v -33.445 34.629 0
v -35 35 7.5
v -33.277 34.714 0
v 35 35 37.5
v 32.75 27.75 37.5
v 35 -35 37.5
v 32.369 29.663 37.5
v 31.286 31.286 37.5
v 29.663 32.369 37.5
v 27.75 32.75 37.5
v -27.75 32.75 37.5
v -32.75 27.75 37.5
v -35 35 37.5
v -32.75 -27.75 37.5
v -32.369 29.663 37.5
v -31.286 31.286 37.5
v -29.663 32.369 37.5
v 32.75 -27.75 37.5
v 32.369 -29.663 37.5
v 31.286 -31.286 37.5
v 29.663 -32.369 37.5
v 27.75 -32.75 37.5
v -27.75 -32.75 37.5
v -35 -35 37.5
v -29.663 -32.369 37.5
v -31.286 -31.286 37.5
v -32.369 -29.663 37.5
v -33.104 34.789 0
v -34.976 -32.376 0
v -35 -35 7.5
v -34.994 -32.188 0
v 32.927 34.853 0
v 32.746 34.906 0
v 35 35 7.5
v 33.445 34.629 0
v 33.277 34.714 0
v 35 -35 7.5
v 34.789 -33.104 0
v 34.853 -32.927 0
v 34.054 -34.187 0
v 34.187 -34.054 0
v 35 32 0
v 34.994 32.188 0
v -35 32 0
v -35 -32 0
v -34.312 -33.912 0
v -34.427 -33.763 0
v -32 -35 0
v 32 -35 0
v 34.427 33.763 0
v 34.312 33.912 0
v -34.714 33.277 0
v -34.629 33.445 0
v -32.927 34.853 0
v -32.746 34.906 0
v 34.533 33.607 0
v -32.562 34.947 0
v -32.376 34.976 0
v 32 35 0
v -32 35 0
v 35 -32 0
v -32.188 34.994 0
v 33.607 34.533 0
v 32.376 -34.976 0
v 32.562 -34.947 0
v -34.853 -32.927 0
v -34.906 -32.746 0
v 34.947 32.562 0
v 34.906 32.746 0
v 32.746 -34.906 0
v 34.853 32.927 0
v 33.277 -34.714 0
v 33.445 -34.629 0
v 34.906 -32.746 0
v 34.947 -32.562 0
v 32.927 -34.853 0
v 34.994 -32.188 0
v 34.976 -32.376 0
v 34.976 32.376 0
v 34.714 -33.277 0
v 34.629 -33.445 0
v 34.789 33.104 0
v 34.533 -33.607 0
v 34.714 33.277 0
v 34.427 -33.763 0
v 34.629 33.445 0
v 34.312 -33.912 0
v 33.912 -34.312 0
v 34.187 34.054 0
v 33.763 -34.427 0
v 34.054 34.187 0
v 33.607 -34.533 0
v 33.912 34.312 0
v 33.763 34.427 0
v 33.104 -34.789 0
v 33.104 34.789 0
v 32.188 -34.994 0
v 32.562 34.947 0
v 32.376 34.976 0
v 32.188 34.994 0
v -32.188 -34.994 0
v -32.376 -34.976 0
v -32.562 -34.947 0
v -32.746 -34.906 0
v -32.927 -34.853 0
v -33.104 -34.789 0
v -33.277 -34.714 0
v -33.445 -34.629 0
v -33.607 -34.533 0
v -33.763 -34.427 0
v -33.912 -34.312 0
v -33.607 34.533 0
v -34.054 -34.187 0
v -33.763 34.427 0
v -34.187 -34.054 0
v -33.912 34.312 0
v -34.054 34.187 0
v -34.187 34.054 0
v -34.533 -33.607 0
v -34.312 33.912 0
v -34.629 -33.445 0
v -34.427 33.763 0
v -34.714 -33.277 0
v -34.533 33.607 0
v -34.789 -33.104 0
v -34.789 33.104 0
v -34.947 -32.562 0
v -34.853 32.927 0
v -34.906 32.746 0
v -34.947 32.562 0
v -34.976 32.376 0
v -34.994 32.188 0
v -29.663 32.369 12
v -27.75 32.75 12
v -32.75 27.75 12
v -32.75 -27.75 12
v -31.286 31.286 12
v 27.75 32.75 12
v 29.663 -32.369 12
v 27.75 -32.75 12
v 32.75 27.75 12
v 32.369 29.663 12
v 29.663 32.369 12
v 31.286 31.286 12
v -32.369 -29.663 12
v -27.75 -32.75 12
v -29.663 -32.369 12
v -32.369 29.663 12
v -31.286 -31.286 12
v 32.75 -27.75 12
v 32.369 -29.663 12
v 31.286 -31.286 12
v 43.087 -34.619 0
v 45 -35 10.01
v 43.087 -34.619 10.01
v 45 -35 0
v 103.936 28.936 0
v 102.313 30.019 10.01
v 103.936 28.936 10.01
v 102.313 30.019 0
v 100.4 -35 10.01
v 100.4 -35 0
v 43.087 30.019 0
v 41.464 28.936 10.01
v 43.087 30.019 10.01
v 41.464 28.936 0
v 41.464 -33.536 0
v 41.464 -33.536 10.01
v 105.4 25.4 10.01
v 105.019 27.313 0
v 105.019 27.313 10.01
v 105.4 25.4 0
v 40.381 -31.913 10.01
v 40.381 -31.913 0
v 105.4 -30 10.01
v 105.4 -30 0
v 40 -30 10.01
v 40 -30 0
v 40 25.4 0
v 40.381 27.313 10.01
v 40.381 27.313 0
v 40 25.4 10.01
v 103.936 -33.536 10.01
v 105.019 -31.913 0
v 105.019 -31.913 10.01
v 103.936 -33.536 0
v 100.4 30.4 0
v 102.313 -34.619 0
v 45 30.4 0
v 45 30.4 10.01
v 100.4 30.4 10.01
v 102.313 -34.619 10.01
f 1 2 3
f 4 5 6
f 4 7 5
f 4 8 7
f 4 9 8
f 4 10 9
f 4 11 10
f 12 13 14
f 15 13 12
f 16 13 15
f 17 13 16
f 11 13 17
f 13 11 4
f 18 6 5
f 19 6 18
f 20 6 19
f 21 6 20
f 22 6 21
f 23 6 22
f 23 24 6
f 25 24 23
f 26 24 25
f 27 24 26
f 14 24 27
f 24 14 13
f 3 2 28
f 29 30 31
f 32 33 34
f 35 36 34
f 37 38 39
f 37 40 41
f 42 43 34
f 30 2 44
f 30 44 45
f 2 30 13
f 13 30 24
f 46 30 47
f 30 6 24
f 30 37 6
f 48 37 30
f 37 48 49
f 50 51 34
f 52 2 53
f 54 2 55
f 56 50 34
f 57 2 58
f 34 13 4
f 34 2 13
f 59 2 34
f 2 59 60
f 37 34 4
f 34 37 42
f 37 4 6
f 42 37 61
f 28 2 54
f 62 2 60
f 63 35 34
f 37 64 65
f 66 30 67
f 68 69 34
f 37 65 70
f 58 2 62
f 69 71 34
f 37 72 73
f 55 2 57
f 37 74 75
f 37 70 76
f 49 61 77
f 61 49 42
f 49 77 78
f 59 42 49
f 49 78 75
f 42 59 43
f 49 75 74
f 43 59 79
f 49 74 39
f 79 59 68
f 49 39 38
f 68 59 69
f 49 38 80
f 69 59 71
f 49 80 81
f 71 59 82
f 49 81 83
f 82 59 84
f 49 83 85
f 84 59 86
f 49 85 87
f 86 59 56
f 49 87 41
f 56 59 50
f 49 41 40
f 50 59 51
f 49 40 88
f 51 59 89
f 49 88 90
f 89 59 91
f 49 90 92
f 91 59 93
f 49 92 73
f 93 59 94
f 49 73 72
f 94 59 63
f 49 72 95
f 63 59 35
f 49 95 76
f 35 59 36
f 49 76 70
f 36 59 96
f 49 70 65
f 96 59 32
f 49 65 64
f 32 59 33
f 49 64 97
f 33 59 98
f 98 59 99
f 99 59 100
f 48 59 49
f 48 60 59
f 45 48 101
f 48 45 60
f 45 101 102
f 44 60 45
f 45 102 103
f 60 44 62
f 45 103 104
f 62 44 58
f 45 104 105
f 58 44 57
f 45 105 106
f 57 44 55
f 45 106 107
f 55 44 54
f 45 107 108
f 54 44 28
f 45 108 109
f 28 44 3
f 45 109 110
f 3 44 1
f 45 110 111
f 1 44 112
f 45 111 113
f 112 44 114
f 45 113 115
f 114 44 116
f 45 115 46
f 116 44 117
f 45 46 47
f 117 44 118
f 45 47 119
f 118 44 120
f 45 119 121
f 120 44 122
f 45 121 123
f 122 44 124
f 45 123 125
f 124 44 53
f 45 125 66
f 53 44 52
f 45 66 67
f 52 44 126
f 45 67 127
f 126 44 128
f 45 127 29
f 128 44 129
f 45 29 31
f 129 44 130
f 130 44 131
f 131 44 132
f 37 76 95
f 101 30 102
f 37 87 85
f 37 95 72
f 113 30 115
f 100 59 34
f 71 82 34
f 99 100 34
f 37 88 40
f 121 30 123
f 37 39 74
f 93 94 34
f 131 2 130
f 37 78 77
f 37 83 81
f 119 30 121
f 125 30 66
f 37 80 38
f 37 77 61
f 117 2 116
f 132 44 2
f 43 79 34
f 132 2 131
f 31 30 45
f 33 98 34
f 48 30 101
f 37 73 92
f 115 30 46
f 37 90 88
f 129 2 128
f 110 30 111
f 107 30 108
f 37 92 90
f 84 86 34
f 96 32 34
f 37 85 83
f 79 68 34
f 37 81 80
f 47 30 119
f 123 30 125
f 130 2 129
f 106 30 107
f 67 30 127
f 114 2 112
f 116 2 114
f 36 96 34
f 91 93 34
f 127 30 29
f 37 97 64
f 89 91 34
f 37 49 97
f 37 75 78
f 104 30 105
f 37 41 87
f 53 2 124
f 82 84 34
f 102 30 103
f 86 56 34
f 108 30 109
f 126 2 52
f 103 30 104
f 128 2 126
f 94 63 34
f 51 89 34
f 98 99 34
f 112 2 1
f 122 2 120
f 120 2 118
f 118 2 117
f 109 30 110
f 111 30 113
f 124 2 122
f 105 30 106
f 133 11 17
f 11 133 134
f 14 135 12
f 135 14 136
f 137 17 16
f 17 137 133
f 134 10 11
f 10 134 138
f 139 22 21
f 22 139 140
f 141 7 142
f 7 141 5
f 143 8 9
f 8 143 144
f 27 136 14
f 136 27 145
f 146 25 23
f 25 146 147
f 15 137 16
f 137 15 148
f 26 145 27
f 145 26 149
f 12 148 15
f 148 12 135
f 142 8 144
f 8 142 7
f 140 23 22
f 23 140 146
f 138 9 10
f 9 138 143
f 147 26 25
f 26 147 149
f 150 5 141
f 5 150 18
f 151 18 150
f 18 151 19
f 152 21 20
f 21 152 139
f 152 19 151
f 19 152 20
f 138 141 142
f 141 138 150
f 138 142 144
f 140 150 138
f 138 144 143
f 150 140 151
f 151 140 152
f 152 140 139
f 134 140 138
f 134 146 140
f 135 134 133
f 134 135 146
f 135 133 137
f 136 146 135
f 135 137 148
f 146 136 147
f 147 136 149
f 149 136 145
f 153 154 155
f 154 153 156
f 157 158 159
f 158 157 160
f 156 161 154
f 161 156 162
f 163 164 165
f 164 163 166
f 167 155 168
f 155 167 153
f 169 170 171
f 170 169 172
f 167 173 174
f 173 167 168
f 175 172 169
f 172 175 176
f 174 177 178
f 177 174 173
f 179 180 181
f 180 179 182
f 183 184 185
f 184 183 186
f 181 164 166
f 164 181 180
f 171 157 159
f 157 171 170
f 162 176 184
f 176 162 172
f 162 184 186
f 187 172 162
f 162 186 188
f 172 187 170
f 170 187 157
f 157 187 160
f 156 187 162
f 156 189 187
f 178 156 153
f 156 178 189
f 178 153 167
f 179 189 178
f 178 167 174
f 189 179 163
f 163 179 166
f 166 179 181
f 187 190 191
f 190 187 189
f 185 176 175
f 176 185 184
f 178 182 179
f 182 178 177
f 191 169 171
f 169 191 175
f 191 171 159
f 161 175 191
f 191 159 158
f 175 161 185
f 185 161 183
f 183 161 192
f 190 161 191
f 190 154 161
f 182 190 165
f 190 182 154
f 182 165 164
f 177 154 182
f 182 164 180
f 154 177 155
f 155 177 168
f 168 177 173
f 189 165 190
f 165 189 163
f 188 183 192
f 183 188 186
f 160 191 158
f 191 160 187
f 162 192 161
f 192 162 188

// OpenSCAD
// parametric box w/lid
// author:  free beachler
// license:  CC 3.0 Share-Alike w/Attribution

base_thickness = 7.5;
wall_thickness = 4.5;
inside_height = 30;	// box height, not including base
width = 70;
leadout = 70;

box_with_inset_lid(base_thickness, wall_thickness, inside_height, width, leadout);

module box_with_inset_lid(bt, wt, h, w, l, hand) {
	box(bt, wt, h, w, l, hand);
	inset_lid(wt, h, w, l);
}

module box(bt, wt, h, w, l) {
	difference() {
		hull() {
		minkowski() {
			translate([-w / 2 + 3, -l / 2 + 3, 0]) cube([w - 3 * 2, l - 3 * 2, bt]);
			cylinder(r = 3, h = 0.01, center = false, $fn = 100);
		}
			translate([-w / 2, -l / 2, bt]) cube([w, l, h]);
		}
		// rounded corners inside
		minkowski() {
			translate([-w / 2 + wt / 2 + 5, -l / 2 + wt / 2 + 5, wt + bt]) cube([w - wt - 5 * 2, l - wt - 5 * 2, h + bt + wt]);
			cylinder(r = 5, h = 0.01, center = false);
		}
	}
}

module inset_lid(wt, h, w, l) {
	translate([w / 2 + 10, -l / 2 + 5, 0]) {
		minkowski() {
			cube([w - wt - 5 * 2 - 0.1, l - wt - 5 * 2 - 0.1, 10]);
			cylinder(r = 5, h = 0.01, center = false);
		}
	}
}

module peg_stop(bt) {
	translate([0, 0, bt + 3]) rotate([180, 0, 0]) {
		cylinder(r = 4, h = bt, center = false);
		translate([0, 0, bt]) cylinder(r = 8, h = 3, center = false);
	}
}
